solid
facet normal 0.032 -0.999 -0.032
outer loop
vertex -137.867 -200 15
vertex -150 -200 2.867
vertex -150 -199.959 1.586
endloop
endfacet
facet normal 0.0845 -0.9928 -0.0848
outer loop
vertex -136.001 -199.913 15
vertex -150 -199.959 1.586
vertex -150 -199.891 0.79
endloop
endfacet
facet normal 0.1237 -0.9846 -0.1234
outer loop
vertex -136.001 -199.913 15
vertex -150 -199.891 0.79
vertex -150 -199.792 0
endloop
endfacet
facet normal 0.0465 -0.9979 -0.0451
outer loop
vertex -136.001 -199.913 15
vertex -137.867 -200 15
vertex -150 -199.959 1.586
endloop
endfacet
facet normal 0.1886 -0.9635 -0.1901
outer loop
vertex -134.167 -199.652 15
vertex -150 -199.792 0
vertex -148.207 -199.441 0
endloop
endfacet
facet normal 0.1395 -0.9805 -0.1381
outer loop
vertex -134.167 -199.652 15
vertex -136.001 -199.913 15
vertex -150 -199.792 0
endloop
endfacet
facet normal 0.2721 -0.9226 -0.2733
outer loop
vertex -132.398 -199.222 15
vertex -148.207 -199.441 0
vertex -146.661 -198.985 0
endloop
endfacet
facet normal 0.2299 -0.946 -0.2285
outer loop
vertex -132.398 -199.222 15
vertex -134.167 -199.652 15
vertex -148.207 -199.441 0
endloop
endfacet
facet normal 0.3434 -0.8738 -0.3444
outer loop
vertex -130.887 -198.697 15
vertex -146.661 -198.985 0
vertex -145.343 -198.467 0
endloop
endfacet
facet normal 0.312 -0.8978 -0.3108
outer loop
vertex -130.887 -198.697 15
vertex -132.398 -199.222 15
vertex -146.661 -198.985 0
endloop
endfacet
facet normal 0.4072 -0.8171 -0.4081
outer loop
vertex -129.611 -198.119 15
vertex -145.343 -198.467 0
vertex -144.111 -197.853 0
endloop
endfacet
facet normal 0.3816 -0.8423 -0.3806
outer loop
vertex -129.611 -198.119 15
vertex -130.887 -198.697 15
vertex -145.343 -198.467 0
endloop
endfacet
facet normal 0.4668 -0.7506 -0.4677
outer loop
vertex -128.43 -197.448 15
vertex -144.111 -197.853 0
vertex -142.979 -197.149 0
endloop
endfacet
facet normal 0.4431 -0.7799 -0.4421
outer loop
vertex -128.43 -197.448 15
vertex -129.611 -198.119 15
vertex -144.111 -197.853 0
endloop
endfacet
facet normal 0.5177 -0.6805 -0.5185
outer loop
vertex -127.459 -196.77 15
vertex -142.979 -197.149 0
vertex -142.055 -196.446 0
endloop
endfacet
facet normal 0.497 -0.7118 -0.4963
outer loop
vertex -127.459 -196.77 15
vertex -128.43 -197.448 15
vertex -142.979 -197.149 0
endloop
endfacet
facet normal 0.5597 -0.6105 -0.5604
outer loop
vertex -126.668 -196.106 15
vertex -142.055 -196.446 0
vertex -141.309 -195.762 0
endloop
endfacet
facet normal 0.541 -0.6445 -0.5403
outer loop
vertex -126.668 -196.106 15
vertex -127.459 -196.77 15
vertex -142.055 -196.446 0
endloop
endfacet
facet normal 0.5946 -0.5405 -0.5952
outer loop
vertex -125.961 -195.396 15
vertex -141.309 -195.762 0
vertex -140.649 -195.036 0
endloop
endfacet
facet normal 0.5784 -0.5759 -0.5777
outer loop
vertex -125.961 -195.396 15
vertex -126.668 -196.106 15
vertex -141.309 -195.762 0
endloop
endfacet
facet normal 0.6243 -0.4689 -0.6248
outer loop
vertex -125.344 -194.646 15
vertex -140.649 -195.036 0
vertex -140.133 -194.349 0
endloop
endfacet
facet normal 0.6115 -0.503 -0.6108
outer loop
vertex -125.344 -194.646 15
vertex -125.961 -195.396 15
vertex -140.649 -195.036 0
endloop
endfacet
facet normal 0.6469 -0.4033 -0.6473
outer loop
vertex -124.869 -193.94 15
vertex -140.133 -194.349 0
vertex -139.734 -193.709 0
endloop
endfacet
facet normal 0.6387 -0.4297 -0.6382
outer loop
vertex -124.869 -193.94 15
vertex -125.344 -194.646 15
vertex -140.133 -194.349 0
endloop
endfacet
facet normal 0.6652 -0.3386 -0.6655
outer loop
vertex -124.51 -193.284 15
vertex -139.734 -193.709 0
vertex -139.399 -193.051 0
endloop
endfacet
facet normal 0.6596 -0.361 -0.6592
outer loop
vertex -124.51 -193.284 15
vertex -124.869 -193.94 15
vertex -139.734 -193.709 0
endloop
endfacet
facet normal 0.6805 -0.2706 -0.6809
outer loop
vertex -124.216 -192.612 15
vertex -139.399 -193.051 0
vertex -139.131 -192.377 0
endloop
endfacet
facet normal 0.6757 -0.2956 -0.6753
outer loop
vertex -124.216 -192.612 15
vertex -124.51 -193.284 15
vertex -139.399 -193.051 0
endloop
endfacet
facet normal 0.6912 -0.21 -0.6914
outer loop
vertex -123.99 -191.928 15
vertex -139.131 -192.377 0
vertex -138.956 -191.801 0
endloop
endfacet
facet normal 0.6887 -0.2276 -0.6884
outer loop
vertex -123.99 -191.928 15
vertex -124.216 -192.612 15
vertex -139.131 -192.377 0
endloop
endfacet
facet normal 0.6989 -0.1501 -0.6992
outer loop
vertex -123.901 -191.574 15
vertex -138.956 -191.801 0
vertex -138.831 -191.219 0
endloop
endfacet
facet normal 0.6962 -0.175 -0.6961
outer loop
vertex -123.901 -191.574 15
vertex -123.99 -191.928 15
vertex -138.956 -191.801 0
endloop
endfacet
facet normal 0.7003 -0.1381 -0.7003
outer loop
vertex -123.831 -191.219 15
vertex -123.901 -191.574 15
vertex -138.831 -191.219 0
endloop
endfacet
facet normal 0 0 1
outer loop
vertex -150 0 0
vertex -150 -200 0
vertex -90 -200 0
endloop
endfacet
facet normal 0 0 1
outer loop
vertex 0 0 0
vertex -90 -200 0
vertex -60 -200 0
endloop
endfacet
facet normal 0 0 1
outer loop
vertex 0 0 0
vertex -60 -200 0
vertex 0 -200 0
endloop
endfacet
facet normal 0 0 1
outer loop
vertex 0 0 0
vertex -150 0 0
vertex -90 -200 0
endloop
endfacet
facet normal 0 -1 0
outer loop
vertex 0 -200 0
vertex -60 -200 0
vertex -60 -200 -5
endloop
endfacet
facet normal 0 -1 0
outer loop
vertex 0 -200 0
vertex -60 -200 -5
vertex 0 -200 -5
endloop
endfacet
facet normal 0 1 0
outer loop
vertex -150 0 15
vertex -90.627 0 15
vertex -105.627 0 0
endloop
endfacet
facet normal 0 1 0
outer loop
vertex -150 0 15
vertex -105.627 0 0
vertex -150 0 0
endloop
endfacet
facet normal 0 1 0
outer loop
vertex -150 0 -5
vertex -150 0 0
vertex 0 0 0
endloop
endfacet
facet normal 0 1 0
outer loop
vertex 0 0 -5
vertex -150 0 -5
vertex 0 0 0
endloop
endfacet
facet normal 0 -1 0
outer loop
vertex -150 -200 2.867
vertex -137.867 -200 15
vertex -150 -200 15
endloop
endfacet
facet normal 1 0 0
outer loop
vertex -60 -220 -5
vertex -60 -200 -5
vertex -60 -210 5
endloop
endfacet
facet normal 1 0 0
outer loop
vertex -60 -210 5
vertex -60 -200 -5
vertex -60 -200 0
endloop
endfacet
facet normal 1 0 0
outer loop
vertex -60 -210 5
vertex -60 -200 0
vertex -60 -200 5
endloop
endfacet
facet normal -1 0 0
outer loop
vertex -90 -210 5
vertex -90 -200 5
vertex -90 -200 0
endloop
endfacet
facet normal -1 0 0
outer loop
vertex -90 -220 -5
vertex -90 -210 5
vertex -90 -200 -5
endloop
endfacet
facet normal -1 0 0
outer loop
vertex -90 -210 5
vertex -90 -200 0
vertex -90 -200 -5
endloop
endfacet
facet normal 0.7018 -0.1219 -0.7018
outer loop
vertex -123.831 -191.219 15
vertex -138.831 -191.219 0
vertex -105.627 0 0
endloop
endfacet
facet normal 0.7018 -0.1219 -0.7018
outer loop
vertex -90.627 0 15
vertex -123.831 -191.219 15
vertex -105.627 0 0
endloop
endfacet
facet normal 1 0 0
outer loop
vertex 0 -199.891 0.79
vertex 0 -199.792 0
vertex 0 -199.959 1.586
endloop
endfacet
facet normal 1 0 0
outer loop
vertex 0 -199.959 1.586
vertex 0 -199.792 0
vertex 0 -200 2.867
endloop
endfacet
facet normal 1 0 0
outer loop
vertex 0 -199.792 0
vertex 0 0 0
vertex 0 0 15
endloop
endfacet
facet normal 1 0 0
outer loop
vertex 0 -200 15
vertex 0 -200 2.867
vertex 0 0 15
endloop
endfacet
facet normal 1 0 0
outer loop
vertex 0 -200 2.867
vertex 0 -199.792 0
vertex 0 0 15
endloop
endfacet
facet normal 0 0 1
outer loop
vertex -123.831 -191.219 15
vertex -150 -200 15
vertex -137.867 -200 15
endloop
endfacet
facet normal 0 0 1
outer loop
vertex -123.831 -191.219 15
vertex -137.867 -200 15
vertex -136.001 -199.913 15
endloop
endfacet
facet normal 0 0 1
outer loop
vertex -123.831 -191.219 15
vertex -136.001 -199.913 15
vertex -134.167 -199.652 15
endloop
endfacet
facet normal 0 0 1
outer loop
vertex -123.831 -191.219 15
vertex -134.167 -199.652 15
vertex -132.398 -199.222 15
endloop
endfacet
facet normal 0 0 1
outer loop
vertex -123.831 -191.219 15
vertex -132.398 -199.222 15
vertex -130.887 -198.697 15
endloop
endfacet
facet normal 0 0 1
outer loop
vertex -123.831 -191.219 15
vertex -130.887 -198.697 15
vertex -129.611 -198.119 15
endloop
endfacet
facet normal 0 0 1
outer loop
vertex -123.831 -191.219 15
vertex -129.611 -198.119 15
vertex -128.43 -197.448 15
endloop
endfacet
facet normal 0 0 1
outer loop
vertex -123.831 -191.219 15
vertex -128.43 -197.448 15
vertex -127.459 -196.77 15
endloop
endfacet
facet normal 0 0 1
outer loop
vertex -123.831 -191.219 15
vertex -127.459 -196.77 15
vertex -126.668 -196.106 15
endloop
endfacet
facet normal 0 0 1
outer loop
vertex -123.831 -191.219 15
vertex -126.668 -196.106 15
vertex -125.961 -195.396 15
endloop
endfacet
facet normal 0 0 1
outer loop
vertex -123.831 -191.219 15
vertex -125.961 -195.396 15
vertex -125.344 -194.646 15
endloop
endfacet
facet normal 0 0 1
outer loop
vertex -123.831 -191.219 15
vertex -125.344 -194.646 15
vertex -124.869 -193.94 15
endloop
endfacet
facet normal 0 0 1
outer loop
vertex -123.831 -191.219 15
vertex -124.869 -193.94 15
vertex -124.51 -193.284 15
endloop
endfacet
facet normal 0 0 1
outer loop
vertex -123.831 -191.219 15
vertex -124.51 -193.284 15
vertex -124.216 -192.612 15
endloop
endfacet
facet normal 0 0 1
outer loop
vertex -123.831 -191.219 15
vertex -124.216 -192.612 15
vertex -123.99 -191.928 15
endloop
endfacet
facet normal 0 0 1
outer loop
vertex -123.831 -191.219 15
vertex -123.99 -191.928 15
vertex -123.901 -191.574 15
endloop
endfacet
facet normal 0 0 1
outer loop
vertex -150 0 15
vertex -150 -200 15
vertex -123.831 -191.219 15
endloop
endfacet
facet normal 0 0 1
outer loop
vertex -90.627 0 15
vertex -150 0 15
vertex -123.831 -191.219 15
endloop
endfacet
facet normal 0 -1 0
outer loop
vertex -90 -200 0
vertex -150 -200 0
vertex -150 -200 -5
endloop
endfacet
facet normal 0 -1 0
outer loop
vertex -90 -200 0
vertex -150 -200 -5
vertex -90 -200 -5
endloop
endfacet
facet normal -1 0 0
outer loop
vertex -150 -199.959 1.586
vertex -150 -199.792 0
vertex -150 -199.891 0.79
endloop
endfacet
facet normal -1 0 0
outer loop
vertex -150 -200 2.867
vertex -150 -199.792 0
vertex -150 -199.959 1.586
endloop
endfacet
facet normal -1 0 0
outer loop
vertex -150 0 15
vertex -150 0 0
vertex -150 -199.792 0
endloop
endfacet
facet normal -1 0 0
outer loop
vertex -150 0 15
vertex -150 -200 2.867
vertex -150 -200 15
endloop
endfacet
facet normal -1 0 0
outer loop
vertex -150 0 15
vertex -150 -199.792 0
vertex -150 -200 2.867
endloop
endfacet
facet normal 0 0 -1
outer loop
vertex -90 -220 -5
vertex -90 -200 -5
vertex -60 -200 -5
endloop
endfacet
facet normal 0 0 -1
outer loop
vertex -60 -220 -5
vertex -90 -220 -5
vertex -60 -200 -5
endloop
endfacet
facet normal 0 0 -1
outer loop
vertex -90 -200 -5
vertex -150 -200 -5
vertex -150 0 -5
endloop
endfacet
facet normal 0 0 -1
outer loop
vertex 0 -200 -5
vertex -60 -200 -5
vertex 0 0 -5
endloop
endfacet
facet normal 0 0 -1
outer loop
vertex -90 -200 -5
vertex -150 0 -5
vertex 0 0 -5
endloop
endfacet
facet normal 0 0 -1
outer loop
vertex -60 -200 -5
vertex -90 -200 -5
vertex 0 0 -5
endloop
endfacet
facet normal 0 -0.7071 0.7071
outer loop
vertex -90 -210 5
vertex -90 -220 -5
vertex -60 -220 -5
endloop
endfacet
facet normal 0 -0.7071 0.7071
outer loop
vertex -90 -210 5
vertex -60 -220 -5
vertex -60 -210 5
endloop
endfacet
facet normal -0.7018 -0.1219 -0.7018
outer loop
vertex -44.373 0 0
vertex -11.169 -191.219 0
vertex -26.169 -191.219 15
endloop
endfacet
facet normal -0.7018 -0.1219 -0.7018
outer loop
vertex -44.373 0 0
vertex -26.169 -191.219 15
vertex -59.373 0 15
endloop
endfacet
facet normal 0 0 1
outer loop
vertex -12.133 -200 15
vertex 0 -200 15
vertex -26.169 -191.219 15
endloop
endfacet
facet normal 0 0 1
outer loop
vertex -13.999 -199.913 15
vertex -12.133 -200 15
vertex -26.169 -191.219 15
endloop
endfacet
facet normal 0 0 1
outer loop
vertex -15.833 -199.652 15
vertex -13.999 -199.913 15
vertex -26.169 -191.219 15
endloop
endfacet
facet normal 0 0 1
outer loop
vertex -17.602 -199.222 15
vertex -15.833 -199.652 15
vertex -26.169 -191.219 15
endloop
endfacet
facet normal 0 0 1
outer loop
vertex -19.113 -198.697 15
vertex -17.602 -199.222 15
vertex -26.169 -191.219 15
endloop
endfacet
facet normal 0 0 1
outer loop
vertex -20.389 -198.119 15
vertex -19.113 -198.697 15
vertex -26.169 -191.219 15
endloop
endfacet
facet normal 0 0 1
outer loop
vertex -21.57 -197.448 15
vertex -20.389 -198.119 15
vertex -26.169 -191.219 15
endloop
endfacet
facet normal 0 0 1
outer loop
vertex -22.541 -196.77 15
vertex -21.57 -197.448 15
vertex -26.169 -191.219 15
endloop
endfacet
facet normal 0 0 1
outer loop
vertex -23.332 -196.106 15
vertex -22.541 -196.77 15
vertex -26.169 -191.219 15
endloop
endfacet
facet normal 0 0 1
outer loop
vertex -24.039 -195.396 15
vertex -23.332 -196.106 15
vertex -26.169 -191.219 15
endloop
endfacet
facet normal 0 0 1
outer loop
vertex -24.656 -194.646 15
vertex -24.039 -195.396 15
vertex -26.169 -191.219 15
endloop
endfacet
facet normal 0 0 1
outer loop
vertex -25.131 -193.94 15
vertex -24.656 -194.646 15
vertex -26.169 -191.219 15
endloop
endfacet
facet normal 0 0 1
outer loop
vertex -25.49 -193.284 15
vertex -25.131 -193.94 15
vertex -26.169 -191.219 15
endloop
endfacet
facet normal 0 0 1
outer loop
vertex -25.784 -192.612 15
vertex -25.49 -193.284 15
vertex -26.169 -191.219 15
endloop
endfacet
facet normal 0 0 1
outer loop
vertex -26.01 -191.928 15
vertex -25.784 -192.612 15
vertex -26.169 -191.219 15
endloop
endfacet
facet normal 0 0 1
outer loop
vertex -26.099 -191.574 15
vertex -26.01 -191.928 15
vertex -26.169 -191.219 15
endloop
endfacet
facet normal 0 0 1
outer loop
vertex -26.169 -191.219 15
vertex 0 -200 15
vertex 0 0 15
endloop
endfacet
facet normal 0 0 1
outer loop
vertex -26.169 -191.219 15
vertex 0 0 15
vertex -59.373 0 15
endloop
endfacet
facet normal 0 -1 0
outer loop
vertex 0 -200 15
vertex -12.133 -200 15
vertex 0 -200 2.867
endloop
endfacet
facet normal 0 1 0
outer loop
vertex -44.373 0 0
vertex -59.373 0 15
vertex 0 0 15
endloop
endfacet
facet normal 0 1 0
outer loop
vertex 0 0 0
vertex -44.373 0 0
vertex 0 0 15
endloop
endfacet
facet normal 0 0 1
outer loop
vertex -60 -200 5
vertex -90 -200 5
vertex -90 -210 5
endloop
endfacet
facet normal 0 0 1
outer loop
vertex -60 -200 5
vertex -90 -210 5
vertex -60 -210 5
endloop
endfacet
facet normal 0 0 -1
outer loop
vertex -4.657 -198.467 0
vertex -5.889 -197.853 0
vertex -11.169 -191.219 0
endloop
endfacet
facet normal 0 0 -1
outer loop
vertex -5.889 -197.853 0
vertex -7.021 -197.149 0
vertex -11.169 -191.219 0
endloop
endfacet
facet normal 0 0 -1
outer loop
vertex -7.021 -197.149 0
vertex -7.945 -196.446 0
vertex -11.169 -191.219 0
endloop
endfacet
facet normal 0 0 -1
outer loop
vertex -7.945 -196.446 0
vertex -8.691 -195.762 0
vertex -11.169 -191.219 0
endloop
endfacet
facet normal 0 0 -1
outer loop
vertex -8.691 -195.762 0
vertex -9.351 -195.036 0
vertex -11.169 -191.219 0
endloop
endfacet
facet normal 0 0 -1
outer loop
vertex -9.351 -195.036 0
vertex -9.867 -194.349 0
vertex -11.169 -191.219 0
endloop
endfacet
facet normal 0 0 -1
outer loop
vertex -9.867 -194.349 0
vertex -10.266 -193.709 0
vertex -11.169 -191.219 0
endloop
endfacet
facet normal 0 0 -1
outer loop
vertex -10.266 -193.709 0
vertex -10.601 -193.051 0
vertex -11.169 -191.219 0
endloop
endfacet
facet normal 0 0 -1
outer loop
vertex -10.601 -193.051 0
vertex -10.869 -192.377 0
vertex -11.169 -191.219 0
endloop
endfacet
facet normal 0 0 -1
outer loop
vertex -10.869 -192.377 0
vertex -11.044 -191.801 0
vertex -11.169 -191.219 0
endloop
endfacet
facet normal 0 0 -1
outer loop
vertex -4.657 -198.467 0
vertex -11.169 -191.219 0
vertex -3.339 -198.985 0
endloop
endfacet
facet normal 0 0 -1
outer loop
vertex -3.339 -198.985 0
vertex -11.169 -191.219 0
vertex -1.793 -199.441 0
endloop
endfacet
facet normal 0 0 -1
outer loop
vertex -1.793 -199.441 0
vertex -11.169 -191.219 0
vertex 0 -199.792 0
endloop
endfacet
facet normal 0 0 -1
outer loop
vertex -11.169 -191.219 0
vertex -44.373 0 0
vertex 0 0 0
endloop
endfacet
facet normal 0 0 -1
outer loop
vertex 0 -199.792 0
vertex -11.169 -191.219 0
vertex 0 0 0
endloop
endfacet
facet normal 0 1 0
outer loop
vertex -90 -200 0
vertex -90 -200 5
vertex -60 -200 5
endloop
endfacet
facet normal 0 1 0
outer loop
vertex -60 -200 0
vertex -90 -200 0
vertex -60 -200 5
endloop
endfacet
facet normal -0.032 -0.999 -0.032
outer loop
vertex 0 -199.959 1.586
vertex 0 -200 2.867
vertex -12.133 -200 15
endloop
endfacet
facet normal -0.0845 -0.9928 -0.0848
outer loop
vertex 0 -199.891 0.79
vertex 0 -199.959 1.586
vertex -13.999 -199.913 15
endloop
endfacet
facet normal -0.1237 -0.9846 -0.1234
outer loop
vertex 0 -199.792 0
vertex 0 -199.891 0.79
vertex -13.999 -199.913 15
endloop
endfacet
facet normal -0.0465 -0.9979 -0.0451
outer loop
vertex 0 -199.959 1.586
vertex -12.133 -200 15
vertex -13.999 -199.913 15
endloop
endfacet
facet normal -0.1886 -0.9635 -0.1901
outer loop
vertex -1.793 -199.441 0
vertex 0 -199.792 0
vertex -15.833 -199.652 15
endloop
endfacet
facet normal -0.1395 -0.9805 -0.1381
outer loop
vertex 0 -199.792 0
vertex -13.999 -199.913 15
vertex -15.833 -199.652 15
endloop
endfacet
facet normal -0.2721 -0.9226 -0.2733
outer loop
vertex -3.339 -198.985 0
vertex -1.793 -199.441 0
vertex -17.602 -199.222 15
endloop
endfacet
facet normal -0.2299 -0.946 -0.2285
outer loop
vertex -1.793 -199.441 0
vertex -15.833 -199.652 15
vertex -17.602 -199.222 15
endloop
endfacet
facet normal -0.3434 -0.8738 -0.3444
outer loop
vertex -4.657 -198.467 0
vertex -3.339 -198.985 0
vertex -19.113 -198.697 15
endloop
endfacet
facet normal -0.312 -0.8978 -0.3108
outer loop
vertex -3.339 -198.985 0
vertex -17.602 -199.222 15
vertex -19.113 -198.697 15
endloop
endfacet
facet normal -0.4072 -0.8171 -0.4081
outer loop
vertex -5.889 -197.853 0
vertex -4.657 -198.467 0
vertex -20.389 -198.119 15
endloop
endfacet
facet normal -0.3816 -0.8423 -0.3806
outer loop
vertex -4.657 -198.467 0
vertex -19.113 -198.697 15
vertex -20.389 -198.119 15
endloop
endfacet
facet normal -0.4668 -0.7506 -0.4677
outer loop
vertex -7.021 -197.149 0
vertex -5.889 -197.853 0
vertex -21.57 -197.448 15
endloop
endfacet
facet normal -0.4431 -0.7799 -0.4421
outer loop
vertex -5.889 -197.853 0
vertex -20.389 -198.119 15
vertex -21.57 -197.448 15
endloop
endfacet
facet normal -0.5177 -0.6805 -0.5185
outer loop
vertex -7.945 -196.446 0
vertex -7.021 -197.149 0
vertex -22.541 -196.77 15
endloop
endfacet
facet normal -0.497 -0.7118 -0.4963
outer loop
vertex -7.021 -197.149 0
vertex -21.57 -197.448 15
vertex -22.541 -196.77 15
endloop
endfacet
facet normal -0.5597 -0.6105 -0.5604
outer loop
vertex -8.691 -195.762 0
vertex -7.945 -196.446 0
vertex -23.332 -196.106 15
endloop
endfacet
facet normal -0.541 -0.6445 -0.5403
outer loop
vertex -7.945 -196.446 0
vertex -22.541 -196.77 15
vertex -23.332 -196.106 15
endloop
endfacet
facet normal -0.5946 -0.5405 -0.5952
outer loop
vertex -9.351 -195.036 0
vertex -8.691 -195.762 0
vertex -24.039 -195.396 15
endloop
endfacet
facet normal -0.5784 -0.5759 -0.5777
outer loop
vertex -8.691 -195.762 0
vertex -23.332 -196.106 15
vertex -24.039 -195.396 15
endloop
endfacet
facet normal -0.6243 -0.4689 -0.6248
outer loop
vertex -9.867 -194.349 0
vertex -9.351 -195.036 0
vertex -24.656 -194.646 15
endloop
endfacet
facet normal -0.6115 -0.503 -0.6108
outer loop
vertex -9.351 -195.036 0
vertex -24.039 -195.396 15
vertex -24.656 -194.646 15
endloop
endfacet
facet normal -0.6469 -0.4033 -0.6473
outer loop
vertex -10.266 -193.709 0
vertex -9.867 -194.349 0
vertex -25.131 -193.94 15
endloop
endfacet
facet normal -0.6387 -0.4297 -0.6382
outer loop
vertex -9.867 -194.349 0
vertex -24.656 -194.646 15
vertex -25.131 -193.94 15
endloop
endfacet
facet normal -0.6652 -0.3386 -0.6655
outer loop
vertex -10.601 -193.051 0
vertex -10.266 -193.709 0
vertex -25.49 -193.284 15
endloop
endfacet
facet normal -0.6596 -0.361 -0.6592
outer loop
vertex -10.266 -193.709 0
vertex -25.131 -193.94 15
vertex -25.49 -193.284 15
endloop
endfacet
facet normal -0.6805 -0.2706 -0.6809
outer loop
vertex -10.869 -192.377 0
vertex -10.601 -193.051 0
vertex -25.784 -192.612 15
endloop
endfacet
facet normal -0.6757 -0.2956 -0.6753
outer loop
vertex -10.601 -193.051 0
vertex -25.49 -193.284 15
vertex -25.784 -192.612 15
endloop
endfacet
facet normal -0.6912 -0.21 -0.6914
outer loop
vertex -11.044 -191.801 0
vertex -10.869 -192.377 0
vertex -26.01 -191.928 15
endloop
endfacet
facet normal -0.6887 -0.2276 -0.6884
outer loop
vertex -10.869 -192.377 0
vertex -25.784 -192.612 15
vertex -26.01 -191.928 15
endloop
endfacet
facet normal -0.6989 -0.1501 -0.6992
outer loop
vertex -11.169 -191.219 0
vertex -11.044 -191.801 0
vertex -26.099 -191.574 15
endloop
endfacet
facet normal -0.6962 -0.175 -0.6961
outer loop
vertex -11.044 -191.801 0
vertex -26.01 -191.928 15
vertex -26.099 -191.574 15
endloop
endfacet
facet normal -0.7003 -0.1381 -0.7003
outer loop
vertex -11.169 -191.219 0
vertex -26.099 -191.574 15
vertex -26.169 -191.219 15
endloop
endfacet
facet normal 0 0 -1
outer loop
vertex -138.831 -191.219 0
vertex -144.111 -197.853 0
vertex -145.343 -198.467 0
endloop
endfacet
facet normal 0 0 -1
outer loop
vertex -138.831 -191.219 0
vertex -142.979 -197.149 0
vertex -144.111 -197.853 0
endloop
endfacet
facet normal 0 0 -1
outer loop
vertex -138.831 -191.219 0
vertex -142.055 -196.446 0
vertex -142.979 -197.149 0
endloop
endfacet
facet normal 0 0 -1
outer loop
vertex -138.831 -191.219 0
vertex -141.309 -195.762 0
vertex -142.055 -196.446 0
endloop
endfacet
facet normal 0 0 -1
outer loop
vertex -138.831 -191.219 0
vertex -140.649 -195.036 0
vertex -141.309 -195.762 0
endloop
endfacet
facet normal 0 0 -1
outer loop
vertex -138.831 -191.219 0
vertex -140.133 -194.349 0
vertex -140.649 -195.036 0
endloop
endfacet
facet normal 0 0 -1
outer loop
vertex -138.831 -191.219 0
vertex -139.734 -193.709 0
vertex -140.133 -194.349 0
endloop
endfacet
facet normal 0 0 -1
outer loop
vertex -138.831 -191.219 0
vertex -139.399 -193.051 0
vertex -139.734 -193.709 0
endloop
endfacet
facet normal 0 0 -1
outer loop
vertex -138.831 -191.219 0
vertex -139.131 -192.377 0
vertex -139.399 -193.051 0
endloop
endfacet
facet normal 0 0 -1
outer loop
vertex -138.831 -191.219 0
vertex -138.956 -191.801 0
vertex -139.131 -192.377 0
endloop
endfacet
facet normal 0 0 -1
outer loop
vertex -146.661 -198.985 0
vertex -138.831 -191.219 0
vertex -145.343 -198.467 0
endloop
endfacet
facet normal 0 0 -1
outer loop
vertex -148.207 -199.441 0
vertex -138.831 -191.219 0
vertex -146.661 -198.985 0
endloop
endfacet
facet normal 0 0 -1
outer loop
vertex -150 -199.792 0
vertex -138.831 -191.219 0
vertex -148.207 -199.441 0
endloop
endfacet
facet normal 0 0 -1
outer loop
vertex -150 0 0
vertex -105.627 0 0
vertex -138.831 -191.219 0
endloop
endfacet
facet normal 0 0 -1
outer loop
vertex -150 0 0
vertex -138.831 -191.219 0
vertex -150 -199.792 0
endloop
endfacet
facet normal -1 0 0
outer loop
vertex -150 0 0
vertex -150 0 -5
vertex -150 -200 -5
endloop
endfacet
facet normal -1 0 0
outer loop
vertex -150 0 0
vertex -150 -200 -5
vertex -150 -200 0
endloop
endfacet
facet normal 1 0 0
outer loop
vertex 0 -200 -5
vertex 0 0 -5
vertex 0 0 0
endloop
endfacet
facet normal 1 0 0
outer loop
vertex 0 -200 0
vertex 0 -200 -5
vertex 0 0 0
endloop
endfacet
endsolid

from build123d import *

# Parameters (mm, degrees)
F1_DEPTH     = 200
F2_T1_DEPTH  = 1079.6863395878
F3_R         = 10
F4_W         = 150
F4_H         = 5
F5_DEPTH     = 200
F8_W         = 30
F8_H         = 5
F9_DEPTH     = 25
F10_T1_DEPTH = 107.150489639


# Not quite as in the source:
# - a fillet or chamfer that OpenCascade refuses, or shapes differently, is made with other operations: its cross-section is extruded or revolved along the edge and cut away or added
# - a feature names something its author has since deleted; it is built from what else it names


with BuildPart() as f1:
    # F0 (on Front) → F1 (new body)
    with BuildSketch(Plane.XZ):
        Polygon((-45, 0), (0, 0), (0, 15), (-60, 15), (-52.5, 7.5), align=None)
    extrude(amount=F1_DEPTH)

    # F2: chamfer of 25 x 203.6086606994 on 1 edges, made by hand

    # F2_s2 → F2_t1 (cut)
    with BuildSketch(Plane(origin=(351.7267661385, 0, -351.7267661385), x_dir=(0, 1, 0), z_dir=(-0.7071067812, 0, 0.7071067812))):
        Polygon((-200, 6.8198051534), (3.6086606994, 31.8198051534), (-200, 31.8198051534), align=None)
    extrude(amount=F2_T1_DEPTH, mode=Mode.SUBTRACT)

    # F3
    f3_edges = [f1.edges().sort_by_distance(p)[0] for p in [
        (-17.144661, -200, 7.5),
    ]]
    fillet(f3_edges, radius=F3_R)


with BuildPart() as f5:
    # F4 (on Front) → F5 (new body)
    with BuildSketch(Plane.XZ):
        with Locations((-75, -2.5)):
            Rectangle(F4_W, F4_H)
    extrude(amount=F5_DEPTH)

    # F8 (on face) → F9 (join)
    with BuildSketch(Plane.XZ.offset(200)):
        with Locations((-75, -2.5)):
            Rectangle(F8_W, F8_H)
        with Locations((-75, 2.5)):
            Rectangle(F8_W, F8_H)
    extrude(amount=F9_DEPTH)

    # F10: chamfer of 15 on 1 edges, made by hand

    # F10_s2 → F10_t1 (cut)
    with BuildSketch(Plane.YZ.offset(-128.5752448195)):
        Polygon((-225, -10), (-210, 5), (-225, 5), align=None)
    extrude(amount=F10_T1_DEPTH, mode=Mode.SUBTRACT)


with BuildPart() as f7_1:
    # F7: instance of F1
    add(f1.part.mirror(Plane.YZ.offset(-75)))


solid = Compound([f1.part, f5.part, f7_1.part])
